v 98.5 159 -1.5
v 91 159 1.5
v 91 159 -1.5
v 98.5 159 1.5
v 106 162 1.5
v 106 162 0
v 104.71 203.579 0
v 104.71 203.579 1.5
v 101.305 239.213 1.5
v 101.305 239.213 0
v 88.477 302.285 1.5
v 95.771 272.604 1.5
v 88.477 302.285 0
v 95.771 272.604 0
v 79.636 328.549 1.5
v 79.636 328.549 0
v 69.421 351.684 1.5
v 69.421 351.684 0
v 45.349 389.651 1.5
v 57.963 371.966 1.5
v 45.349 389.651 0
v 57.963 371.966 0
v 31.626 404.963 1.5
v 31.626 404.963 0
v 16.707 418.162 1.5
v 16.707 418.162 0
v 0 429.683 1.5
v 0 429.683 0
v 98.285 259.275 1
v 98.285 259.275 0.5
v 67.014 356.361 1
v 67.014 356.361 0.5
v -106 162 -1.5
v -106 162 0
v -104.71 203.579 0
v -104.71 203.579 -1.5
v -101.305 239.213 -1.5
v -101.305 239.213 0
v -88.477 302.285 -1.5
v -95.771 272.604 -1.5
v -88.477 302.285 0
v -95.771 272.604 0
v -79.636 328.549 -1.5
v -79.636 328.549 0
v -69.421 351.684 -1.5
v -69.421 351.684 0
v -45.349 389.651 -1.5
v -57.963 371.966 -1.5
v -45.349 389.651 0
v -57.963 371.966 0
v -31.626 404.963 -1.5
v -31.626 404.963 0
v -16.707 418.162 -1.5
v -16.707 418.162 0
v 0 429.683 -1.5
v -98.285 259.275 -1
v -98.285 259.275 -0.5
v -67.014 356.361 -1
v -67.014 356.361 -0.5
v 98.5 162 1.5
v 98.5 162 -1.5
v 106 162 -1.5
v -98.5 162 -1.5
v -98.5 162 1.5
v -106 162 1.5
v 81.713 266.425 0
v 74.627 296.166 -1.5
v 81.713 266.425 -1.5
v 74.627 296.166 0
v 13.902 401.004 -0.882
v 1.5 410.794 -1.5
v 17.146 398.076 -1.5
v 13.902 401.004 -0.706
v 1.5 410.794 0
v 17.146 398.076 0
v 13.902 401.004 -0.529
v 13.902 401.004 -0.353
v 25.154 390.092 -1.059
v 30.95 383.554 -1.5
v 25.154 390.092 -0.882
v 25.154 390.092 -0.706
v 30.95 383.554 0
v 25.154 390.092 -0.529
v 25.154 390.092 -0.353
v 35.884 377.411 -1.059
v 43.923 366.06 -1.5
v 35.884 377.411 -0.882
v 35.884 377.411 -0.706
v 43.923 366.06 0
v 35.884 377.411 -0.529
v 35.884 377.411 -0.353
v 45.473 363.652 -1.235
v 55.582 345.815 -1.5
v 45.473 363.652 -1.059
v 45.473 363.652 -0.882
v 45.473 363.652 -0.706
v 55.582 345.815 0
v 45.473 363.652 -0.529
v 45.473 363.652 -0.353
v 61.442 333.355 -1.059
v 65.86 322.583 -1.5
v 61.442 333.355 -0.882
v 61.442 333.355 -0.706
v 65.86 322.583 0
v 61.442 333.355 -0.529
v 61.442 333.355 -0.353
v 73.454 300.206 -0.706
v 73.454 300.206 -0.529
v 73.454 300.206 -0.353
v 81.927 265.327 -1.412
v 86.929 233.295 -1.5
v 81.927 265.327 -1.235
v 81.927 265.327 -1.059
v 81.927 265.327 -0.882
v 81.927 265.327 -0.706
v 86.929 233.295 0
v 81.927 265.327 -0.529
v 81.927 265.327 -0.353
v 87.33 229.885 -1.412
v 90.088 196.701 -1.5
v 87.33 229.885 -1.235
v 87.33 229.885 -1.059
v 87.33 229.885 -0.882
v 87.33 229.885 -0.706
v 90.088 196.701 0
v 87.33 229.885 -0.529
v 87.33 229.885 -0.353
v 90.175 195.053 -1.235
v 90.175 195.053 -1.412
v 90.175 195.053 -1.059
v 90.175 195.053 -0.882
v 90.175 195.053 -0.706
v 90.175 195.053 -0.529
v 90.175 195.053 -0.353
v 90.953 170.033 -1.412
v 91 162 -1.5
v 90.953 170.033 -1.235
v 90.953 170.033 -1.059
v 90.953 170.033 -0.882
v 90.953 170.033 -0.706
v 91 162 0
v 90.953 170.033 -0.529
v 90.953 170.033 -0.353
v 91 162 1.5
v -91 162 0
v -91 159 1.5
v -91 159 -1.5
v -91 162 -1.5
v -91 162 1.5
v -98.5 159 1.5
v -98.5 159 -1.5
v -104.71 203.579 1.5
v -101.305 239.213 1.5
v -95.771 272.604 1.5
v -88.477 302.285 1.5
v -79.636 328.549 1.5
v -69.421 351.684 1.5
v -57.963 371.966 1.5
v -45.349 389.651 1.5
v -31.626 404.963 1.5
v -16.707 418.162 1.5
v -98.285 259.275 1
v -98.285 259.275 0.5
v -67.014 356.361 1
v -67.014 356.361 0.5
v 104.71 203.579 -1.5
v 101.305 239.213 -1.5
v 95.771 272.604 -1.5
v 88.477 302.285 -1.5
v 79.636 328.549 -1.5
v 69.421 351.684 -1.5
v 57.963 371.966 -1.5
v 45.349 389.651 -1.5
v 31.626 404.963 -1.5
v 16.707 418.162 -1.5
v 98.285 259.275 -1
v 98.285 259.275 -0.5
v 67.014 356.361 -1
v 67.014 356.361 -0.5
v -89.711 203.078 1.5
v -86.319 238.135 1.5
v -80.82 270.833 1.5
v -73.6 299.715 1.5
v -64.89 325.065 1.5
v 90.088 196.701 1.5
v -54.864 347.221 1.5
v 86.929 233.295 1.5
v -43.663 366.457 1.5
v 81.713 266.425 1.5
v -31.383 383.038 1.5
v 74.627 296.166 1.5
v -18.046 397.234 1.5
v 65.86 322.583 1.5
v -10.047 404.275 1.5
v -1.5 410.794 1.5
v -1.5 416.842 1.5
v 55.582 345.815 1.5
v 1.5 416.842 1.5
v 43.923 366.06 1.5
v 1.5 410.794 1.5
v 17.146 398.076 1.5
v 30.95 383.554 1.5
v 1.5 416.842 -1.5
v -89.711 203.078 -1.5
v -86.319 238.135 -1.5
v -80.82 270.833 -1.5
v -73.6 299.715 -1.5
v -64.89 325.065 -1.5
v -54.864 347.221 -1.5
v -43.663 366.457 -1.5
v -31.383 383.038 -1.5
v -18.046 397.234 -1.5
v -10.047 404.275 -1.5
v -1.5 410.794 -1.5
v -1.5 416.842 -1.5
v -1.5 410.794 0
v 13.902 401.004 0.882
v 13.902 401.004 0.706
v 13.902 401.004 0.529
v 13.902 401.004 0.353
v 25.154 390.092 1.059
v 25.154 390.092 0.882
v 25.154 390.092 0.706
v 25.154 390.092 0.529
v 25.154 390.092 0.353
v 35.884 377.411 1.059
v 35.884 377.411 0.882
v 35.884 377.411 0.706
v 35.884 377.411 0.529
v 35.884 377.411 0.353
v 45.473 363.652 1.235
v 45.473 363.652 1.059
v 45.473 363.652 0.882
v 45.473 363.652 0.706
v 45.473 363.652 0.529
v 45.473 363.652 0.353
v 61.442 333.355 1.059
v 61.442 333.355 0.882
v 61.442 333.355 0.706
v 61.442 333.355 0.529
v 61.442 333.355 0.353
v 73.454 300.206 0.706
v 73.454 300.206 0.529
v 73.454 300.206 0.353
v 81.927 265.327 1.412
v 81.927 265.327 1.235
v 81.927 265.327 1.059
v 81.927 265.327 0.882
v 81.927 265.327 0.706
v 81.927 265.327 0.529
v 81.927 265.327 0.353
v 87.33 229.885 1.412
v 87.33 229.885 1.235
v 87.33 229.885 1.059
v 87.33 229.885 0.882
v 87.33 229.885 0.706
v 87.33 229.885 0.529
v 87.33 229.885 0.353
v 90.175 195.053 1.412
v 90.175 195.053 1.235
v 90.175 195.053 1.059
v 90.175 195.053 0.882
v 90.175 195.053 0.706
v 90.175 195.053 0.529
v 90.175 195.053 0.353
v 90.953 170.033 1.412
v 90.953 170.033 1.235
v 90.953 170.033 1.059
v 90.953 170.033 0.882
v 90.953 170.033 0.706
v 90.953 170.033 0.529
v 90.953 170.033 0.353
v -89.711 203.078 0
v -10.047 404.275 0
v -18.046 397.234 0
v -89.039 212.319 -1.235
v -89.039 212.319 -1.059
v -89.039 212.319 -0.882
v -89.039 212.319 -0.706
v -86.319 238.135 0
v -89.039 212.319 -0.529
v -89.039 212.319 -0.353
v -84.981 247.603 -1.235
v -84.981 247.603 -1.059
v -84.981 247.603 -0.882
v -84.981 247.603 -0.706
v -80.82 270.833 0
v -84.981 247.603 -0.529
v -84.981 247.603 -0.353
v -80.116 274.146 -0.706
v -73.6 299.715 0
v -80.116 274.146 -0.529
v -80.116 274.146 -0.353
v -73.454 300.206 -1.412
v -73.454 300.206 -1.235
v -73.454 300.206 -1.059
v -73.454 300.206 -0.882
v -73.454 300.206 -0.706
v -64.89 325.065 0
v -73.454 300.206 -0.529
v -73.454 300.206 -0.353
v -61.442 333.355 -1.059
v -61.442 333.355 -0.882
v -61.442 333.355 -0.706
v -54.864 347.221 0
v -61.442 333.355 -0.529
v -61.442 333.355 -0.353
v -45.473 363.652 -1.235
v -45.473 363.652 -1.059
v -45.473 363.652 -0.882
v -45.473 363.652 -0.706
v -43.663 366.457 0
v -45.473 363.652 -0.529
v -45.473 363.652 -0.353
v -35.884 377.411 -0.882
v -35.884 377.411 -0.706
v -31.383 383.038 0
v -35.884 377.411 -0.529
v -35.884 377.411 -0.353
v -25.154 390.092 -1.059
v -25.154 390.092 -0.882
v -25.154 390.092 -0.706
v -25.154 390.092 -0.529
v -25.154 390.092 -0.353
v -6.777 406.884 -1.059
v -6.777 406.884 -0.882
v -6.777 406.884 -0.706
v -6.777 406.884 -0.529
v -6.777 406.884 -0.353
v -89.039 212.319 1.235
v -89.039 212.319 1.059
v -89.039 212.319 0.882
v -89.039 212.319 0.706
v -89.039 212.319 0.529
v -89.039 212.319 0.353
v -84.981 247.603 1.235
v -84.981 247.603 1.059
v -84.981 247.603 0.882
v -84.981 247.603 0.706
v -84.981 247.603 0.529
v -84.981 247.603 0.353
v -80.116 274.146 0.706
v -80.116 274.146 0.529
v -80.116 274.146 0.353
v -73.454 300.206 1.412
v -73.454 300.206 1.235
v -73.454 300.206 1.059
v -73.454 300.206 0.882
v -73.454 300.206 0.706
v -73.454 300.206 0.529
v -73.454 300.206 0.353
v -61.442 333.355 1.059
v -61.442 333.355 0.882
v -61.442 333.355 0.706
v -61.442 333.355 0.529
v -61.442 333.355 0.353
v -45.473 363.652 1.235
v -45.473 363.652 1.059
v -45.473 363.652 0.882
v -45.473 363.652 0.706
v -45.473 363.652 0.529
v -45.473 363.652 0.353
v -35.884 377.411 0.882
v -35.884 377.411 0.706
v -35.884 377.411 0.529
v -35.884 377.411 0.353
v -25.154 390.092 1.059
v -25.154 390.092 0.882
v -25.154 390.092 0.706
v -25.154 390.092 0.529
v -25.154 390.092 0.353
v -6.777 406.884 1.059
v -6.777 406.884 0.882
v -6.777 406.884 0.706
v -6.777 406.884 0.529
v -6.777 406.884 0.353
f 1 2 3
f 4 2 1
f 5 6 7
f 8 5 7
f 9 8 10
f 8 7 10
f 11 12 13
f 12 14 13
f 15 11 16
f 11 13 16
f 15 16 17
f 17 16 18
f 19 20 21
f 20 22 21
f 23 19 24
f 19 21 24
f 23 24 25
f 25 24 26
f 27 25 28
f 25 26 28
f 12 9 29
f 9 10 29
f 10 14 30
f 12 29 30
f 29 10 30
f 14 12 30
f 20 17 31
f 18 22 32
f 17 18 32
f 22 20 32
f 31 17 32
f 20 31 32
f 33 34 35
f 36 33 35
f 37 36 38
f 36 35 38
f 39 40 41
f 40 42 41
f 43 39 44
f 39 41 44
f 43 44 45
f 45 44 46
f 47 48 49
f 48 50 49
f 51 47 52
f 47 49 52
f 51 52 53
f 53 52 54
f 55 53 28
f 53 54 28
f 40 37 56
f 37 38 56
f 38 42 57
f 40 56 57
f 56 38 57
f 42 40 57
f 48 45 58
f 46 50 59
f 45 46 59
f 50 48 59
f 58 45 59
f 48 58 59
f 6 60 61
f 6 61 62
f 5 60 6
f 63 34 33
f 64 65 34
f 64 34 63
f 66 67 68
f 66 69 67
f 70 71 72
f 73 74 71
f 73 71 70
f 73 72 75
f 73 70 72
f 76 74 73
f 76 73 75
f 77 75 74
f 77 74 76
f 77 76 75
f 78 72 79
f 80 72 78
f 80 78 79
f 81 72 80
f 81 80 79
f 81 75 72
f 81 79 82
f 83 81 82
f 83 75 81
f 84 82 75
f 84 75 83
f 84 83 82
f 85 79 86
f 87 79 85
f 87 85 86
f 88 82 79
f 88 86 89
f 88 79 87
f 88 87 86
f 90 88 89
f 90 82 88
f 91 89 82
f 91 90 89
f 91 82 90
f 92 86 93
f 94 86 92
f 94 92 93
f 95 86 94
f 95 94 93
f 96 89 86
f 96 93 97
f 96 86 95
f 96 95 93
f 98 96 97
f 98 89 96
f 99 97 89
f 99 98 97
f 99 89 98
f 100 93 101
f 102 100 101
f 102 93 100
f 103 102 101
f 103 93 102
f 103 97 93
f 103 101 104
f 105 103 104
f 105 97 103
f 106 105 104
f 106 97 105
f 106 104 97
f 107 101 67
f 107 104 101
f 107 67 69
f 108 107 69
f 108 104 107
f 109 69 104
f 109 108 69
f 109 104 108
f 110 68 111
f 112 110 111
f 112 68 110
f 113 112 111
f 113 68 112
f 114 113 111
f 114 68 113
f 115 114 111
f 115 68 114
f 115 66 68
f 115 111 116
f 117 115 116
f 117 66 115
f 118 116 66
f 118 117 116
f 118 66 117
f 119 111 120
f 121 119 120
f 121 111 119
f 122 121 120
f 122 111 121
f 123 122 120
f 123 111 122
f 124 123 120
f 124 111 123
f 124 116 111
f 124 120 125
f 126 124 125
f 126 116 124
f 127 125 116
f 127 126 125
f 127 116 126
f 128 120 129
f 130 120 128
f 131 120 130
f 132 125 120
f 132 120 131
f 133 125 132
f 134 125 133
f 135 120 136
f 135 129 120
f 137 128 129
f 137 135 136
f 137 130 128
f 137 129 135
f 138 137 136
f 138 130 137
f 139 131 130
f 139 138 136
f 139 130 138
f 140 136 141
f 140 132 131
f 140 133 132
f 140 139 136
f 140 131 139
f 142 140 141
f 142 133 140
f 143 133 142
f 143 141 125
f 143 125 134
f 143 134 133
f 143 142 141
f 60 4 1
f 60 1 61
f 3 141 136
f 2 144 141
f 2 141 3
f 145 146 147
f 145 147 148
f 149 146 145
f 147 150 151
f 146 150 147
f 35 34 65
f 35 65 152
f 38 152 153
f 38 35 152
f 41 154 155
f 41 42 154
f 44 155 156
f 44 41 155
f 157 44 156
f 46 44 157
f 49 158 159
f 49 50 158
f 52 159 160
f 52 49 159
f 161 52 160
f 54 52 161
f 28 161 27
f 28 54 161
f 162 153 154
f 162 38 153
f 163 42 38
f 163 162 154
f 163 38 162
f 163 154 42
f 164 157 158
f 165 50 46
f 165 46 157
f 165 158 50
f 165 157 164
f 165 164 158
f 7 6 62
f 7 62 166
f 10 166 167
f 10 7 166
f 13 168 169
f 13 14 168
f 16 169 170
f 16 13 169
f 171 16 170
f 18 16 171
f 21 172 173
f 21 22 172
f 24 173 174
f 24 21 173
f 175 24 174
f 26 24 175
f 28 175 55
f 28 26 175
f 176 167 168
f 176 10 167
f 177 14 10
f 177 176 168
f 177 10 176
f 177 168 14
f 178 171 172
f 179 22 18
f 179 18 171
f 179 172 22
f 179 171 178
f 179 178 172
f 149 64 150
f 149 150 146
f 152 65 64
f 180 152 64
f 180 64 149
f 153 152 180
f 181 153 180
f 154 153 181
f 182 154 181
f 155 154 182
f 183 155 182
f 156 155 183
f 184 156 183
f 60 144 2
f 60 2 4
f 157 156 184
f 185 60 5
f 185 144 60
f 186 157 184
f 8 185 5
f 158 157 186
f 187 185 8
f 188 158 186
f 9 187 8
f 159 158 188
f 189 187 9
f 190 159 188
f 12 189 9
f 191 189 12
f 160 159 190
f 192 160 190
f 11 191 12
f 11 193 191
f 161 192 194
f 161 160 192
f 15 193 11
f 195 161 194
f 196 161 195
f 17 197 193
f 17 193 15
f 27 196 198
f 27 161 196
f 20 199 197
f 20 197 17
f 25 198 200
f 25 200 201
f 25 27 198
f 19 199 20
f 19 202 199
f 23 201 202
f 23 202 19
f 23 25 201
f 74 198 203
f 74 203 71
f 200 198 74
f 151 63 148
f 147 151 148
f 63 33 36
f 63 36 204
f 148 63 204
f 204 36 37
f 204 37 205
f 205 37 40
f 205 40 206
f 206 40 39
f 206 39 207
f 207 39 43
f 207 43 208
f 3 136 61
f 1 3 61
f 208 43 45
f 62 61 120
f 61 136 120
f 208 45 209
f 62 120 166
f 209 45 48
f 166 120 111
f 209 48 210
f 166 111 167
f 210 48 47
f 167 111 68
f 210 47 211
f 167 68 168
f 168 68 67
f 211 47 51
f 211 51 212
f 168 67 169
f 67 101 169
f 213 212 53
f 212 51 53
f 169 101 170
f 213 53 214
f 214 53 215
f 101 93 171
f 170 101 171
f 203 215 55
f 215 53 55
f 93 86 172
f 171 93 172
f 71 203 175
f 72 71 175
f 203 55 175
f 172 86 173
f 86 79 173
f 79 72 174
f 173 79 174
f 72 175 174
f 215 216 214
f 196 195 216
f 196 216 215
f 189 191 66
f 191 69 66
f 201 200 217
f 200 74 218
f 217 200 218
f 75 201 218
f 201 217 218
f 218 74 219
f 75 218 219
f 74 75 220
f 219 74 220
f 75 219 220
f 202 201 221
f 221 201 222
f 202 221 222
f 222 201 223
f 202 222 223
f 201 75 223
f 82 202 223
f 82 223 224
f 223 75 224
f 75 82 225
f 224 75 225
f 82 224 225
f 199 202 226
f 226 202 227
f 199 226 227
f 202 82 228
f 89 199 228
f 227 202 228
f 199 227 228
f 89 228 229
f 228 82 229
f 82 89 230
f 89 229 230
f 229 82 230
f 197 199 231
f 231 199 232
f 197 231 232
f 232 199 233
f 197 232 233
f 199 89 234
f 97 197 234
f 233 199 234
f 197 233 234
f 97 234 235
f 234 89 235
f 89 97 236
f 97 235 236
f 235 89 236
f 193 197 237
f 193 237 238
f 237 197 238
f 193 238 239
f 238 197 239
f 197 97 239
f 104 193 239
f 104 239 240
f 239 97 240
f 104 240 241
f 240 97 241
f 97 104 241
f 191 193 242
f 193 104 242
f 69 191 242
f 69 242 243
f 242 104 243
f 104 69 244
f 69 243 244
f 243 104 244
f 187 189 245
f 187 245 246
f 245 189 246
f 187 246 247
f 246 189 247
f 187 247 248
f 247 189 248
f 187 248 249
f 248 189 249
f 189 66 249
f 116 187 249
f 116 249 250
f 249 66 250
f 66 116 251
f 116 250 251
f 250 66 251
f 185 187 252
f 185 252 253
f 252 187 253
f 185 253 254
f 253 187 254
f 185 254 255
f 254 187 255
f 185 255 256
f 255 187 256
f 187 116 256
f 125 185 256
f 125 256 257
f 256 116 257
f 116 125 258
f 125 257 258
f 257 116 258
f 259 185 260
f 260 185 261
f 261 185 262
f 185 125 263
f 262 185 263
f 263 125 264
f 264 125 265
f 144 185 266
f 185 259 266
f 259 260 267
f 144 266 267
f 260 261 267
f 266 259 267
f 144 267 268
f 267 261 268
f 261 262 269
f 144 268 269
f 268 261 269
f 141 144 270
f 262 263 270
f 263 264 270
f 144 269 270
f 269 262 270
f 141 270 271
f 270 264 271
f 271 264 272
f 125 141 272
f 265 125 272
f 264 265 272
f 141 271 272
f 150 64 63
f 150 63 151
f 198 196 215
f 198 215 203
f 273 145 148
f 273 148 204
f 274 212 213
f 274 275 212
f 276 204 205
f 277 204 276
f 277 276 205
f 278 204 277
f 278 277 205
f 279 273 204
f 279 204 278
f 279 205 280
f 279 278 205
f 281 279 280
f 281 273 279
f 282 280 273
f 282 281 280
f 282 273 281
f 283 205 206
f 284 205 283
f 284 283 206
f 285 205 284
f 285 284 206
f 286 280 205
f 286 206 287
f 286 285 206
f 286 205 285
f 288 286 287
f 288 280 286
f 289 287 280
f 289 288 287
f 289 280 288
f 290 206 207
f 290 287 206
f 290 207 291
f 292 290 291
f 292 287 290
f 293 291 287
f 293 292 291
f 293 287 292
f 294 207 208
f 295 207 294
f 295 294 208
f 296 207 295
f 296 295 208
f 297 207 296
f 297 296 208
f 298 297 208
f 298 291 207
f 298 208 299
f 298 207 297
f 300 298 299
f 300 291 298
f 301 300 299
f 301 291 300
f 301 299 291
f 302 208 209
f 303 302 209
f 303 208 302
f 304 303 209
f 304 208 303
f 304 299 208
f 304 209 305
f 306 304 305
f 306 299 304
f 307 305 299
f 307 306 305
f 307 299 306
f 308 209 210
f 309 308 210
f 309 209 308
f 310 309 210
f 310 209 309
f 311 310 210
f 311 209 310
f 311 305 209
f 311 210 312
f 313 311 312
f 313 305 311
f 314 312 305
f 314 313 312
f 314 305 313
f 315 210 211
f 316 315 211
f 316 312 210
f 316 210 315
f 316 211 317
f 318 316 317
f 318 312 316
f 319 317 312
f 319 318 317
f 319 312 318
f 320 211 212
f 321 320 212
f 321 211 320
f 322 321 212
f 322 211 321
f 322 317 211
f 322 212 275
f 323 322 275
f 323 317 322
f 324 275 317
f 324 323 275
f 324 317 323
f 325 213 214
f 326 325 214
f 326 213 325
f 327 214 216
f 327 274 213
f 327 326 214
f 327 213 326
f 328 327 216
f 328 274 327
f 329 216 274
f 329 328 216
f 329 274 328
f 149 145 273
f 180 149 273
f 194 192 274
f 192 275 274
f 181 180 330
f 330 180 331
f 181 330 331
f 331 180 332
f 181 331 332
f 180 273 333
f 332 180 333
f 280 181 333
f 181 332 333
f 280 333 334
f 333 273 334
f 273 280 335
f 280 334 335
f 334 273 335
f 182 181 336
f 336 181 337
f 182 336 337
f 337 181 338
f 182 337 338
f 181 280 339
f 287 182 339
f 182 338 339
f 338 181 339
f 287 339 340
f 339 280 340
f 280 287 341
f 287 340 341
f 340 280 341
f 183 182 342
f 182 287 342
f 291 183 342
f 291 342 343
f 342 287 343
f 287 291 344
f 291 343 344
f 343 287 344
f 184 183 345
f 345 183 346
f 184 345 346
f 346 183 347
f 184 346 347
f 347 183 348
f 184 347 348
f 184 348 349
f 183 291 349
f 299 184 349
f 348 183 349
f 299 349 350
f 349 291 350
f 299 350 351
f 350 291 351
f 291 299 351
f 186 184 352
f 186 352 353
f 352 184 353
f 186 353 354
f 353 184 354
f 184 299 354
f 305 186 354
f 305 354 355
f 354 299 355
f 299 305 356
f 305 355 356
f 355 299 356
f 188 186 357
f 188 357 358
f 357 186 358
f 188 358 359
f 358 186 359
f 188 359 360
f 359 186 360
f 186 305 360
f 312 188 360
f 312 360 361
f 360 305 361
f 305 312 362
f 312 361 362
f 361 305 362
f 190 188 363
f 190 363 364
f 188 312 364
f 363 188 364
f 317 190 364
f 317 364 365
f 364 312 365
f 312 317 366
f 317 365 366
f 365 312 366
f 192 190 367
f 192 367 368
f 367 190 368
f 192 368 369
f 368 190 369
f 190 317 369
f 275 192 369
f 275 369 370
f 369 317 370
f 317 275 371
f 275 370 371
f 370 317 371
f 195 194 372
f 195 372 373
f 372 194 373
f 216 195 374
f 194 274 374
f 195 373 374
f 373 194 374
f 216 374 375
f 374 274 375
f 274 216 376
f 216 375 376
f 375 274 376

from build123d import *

# Parameters (mm, degrees)
BOSS_EXTRUDE1_DEPTH = 1.5


with BuildPart() as part:
    # Sketch1 → Boss-Extrude1 (new, symmetric)
    with BuildSketch(Plane.XY):
        with BuildLine():
            Line((-106, 162), (-98.5, 162))
            Line((-98.5, 162), (-98.5, 159))
            Line((-98.5, 159), (-91, 159))
            Line((-91, 159), (-91, 162))
            add(Edge.make_bspline(
                [(-91, 162), (-91, 163.331524141), (-90.992376318, 165.983870931), (-90.945171024, 171.374041262), (-90.823504223, 178.205929247), (-90.568516042, 186.555758505), (-90.071645038, 197.860045048), (-89.134789291, 212.26907526), (-87.43709218, 229.859021299), (-85.098976262, 247.601905442), (-81.040866449, 271.26711415), (-74.045466816, 300.495547841), (-62.102149991, 333.833287872), (-48.848124705, 359.221840008), (-36.073317005, 377.590452103), (-25.355695414, 390.287212667), (-15.418026325, 399.891290702), (-7.305039618, 406.550984174), (-3.288780832, 409.527699977), (-1.5, 410.793822053)],
                knots=[0, 0, 0, 0, 0.015112969, 0.030225939, 0.060451877, 0.090677816, 0.120903754, 0.181355631, 0.241807508, 0.302259385, 0.362711262, 0.483615016, 0.60451877, 0.725422524, 0.785874401, 0.846326278, 0.906778155, 0.937004094, 0.960647293, 0.960647293, 0.960647293, 0.960647293], degree=3))
            Line((-1.5, 410.793822053), (-1.5, 416.841652361))
            Line((-1.5, 416.841652361), (1.5, 416.841652361))
            Line((1.5, 416.841652361), (1.5, 410.793822053))
            add(Edge.make_bspline(
                [(1.5, 410.793822053), (3.288780833, 409.527699976), (7.305039619, 406.550984173), (15.418026325, 399.891290702), (25.355695414, 390.287212667), (36.073317005, 377.590452103), (48.848124705, 359.221840008), (62.102149991, 333.833287872), (74.045466816, 300.495547841), (81.040866449, 271.26711415), (85.098976262, 247.601905442), (87.43709218, 229.859021299), (89.134789291, 212.26907526), (90.071645038, 197.860045048), (90.568516042, 186.555758505), (90.823504223, 178.205929247), (90.945171024, 171.374041262), (90.992376318, 165.983870931), (91, 163.331524141), (91, 162)],
                knots=[0.00658274, 0.00658274, 0.00658274, 0.00658274, 0.030225939, 0.060451877, 0.120903754, 0.181355631, 0.241807508, 0.362711262, 0.483615016, 0.60451877, 0.664970647, 0.725422524, 0.785874401, 0.846326278, 0.876552217, 0.906778155, 0.937004094, 0.952117063, 0.967230032, 0.967230032, 0.967230032, 0.967230032], degree=3))
            Line((91, 162), (91, 159))
            Line((91, 159), (98.5, 159))
            Line((98.5, 159), (98.5, 162))
            Line((98.5, 162), (106, 162))
            add(Edge.make_bspline(
                [(106, 162), (106, 251.51123923), (88.948086668, 376.101025723), (0, 429.683378347)],
                knots=[0, 0, 0, 0, 1, 1, 1, 1], degree=3))
            add(Edge.make_bspline(
                [(-106, 162), (-106, 251.51123923), (-88.948086668, 376.101025723), (0, 429.683378347)],
                knots=[0, 0, 0, 0, 1, 1, 1, 1], degree=3))
        make_face()
    extrude(amount=BOSS_EXTRUDE1_DEPTH, both=True)


solid = part.part
